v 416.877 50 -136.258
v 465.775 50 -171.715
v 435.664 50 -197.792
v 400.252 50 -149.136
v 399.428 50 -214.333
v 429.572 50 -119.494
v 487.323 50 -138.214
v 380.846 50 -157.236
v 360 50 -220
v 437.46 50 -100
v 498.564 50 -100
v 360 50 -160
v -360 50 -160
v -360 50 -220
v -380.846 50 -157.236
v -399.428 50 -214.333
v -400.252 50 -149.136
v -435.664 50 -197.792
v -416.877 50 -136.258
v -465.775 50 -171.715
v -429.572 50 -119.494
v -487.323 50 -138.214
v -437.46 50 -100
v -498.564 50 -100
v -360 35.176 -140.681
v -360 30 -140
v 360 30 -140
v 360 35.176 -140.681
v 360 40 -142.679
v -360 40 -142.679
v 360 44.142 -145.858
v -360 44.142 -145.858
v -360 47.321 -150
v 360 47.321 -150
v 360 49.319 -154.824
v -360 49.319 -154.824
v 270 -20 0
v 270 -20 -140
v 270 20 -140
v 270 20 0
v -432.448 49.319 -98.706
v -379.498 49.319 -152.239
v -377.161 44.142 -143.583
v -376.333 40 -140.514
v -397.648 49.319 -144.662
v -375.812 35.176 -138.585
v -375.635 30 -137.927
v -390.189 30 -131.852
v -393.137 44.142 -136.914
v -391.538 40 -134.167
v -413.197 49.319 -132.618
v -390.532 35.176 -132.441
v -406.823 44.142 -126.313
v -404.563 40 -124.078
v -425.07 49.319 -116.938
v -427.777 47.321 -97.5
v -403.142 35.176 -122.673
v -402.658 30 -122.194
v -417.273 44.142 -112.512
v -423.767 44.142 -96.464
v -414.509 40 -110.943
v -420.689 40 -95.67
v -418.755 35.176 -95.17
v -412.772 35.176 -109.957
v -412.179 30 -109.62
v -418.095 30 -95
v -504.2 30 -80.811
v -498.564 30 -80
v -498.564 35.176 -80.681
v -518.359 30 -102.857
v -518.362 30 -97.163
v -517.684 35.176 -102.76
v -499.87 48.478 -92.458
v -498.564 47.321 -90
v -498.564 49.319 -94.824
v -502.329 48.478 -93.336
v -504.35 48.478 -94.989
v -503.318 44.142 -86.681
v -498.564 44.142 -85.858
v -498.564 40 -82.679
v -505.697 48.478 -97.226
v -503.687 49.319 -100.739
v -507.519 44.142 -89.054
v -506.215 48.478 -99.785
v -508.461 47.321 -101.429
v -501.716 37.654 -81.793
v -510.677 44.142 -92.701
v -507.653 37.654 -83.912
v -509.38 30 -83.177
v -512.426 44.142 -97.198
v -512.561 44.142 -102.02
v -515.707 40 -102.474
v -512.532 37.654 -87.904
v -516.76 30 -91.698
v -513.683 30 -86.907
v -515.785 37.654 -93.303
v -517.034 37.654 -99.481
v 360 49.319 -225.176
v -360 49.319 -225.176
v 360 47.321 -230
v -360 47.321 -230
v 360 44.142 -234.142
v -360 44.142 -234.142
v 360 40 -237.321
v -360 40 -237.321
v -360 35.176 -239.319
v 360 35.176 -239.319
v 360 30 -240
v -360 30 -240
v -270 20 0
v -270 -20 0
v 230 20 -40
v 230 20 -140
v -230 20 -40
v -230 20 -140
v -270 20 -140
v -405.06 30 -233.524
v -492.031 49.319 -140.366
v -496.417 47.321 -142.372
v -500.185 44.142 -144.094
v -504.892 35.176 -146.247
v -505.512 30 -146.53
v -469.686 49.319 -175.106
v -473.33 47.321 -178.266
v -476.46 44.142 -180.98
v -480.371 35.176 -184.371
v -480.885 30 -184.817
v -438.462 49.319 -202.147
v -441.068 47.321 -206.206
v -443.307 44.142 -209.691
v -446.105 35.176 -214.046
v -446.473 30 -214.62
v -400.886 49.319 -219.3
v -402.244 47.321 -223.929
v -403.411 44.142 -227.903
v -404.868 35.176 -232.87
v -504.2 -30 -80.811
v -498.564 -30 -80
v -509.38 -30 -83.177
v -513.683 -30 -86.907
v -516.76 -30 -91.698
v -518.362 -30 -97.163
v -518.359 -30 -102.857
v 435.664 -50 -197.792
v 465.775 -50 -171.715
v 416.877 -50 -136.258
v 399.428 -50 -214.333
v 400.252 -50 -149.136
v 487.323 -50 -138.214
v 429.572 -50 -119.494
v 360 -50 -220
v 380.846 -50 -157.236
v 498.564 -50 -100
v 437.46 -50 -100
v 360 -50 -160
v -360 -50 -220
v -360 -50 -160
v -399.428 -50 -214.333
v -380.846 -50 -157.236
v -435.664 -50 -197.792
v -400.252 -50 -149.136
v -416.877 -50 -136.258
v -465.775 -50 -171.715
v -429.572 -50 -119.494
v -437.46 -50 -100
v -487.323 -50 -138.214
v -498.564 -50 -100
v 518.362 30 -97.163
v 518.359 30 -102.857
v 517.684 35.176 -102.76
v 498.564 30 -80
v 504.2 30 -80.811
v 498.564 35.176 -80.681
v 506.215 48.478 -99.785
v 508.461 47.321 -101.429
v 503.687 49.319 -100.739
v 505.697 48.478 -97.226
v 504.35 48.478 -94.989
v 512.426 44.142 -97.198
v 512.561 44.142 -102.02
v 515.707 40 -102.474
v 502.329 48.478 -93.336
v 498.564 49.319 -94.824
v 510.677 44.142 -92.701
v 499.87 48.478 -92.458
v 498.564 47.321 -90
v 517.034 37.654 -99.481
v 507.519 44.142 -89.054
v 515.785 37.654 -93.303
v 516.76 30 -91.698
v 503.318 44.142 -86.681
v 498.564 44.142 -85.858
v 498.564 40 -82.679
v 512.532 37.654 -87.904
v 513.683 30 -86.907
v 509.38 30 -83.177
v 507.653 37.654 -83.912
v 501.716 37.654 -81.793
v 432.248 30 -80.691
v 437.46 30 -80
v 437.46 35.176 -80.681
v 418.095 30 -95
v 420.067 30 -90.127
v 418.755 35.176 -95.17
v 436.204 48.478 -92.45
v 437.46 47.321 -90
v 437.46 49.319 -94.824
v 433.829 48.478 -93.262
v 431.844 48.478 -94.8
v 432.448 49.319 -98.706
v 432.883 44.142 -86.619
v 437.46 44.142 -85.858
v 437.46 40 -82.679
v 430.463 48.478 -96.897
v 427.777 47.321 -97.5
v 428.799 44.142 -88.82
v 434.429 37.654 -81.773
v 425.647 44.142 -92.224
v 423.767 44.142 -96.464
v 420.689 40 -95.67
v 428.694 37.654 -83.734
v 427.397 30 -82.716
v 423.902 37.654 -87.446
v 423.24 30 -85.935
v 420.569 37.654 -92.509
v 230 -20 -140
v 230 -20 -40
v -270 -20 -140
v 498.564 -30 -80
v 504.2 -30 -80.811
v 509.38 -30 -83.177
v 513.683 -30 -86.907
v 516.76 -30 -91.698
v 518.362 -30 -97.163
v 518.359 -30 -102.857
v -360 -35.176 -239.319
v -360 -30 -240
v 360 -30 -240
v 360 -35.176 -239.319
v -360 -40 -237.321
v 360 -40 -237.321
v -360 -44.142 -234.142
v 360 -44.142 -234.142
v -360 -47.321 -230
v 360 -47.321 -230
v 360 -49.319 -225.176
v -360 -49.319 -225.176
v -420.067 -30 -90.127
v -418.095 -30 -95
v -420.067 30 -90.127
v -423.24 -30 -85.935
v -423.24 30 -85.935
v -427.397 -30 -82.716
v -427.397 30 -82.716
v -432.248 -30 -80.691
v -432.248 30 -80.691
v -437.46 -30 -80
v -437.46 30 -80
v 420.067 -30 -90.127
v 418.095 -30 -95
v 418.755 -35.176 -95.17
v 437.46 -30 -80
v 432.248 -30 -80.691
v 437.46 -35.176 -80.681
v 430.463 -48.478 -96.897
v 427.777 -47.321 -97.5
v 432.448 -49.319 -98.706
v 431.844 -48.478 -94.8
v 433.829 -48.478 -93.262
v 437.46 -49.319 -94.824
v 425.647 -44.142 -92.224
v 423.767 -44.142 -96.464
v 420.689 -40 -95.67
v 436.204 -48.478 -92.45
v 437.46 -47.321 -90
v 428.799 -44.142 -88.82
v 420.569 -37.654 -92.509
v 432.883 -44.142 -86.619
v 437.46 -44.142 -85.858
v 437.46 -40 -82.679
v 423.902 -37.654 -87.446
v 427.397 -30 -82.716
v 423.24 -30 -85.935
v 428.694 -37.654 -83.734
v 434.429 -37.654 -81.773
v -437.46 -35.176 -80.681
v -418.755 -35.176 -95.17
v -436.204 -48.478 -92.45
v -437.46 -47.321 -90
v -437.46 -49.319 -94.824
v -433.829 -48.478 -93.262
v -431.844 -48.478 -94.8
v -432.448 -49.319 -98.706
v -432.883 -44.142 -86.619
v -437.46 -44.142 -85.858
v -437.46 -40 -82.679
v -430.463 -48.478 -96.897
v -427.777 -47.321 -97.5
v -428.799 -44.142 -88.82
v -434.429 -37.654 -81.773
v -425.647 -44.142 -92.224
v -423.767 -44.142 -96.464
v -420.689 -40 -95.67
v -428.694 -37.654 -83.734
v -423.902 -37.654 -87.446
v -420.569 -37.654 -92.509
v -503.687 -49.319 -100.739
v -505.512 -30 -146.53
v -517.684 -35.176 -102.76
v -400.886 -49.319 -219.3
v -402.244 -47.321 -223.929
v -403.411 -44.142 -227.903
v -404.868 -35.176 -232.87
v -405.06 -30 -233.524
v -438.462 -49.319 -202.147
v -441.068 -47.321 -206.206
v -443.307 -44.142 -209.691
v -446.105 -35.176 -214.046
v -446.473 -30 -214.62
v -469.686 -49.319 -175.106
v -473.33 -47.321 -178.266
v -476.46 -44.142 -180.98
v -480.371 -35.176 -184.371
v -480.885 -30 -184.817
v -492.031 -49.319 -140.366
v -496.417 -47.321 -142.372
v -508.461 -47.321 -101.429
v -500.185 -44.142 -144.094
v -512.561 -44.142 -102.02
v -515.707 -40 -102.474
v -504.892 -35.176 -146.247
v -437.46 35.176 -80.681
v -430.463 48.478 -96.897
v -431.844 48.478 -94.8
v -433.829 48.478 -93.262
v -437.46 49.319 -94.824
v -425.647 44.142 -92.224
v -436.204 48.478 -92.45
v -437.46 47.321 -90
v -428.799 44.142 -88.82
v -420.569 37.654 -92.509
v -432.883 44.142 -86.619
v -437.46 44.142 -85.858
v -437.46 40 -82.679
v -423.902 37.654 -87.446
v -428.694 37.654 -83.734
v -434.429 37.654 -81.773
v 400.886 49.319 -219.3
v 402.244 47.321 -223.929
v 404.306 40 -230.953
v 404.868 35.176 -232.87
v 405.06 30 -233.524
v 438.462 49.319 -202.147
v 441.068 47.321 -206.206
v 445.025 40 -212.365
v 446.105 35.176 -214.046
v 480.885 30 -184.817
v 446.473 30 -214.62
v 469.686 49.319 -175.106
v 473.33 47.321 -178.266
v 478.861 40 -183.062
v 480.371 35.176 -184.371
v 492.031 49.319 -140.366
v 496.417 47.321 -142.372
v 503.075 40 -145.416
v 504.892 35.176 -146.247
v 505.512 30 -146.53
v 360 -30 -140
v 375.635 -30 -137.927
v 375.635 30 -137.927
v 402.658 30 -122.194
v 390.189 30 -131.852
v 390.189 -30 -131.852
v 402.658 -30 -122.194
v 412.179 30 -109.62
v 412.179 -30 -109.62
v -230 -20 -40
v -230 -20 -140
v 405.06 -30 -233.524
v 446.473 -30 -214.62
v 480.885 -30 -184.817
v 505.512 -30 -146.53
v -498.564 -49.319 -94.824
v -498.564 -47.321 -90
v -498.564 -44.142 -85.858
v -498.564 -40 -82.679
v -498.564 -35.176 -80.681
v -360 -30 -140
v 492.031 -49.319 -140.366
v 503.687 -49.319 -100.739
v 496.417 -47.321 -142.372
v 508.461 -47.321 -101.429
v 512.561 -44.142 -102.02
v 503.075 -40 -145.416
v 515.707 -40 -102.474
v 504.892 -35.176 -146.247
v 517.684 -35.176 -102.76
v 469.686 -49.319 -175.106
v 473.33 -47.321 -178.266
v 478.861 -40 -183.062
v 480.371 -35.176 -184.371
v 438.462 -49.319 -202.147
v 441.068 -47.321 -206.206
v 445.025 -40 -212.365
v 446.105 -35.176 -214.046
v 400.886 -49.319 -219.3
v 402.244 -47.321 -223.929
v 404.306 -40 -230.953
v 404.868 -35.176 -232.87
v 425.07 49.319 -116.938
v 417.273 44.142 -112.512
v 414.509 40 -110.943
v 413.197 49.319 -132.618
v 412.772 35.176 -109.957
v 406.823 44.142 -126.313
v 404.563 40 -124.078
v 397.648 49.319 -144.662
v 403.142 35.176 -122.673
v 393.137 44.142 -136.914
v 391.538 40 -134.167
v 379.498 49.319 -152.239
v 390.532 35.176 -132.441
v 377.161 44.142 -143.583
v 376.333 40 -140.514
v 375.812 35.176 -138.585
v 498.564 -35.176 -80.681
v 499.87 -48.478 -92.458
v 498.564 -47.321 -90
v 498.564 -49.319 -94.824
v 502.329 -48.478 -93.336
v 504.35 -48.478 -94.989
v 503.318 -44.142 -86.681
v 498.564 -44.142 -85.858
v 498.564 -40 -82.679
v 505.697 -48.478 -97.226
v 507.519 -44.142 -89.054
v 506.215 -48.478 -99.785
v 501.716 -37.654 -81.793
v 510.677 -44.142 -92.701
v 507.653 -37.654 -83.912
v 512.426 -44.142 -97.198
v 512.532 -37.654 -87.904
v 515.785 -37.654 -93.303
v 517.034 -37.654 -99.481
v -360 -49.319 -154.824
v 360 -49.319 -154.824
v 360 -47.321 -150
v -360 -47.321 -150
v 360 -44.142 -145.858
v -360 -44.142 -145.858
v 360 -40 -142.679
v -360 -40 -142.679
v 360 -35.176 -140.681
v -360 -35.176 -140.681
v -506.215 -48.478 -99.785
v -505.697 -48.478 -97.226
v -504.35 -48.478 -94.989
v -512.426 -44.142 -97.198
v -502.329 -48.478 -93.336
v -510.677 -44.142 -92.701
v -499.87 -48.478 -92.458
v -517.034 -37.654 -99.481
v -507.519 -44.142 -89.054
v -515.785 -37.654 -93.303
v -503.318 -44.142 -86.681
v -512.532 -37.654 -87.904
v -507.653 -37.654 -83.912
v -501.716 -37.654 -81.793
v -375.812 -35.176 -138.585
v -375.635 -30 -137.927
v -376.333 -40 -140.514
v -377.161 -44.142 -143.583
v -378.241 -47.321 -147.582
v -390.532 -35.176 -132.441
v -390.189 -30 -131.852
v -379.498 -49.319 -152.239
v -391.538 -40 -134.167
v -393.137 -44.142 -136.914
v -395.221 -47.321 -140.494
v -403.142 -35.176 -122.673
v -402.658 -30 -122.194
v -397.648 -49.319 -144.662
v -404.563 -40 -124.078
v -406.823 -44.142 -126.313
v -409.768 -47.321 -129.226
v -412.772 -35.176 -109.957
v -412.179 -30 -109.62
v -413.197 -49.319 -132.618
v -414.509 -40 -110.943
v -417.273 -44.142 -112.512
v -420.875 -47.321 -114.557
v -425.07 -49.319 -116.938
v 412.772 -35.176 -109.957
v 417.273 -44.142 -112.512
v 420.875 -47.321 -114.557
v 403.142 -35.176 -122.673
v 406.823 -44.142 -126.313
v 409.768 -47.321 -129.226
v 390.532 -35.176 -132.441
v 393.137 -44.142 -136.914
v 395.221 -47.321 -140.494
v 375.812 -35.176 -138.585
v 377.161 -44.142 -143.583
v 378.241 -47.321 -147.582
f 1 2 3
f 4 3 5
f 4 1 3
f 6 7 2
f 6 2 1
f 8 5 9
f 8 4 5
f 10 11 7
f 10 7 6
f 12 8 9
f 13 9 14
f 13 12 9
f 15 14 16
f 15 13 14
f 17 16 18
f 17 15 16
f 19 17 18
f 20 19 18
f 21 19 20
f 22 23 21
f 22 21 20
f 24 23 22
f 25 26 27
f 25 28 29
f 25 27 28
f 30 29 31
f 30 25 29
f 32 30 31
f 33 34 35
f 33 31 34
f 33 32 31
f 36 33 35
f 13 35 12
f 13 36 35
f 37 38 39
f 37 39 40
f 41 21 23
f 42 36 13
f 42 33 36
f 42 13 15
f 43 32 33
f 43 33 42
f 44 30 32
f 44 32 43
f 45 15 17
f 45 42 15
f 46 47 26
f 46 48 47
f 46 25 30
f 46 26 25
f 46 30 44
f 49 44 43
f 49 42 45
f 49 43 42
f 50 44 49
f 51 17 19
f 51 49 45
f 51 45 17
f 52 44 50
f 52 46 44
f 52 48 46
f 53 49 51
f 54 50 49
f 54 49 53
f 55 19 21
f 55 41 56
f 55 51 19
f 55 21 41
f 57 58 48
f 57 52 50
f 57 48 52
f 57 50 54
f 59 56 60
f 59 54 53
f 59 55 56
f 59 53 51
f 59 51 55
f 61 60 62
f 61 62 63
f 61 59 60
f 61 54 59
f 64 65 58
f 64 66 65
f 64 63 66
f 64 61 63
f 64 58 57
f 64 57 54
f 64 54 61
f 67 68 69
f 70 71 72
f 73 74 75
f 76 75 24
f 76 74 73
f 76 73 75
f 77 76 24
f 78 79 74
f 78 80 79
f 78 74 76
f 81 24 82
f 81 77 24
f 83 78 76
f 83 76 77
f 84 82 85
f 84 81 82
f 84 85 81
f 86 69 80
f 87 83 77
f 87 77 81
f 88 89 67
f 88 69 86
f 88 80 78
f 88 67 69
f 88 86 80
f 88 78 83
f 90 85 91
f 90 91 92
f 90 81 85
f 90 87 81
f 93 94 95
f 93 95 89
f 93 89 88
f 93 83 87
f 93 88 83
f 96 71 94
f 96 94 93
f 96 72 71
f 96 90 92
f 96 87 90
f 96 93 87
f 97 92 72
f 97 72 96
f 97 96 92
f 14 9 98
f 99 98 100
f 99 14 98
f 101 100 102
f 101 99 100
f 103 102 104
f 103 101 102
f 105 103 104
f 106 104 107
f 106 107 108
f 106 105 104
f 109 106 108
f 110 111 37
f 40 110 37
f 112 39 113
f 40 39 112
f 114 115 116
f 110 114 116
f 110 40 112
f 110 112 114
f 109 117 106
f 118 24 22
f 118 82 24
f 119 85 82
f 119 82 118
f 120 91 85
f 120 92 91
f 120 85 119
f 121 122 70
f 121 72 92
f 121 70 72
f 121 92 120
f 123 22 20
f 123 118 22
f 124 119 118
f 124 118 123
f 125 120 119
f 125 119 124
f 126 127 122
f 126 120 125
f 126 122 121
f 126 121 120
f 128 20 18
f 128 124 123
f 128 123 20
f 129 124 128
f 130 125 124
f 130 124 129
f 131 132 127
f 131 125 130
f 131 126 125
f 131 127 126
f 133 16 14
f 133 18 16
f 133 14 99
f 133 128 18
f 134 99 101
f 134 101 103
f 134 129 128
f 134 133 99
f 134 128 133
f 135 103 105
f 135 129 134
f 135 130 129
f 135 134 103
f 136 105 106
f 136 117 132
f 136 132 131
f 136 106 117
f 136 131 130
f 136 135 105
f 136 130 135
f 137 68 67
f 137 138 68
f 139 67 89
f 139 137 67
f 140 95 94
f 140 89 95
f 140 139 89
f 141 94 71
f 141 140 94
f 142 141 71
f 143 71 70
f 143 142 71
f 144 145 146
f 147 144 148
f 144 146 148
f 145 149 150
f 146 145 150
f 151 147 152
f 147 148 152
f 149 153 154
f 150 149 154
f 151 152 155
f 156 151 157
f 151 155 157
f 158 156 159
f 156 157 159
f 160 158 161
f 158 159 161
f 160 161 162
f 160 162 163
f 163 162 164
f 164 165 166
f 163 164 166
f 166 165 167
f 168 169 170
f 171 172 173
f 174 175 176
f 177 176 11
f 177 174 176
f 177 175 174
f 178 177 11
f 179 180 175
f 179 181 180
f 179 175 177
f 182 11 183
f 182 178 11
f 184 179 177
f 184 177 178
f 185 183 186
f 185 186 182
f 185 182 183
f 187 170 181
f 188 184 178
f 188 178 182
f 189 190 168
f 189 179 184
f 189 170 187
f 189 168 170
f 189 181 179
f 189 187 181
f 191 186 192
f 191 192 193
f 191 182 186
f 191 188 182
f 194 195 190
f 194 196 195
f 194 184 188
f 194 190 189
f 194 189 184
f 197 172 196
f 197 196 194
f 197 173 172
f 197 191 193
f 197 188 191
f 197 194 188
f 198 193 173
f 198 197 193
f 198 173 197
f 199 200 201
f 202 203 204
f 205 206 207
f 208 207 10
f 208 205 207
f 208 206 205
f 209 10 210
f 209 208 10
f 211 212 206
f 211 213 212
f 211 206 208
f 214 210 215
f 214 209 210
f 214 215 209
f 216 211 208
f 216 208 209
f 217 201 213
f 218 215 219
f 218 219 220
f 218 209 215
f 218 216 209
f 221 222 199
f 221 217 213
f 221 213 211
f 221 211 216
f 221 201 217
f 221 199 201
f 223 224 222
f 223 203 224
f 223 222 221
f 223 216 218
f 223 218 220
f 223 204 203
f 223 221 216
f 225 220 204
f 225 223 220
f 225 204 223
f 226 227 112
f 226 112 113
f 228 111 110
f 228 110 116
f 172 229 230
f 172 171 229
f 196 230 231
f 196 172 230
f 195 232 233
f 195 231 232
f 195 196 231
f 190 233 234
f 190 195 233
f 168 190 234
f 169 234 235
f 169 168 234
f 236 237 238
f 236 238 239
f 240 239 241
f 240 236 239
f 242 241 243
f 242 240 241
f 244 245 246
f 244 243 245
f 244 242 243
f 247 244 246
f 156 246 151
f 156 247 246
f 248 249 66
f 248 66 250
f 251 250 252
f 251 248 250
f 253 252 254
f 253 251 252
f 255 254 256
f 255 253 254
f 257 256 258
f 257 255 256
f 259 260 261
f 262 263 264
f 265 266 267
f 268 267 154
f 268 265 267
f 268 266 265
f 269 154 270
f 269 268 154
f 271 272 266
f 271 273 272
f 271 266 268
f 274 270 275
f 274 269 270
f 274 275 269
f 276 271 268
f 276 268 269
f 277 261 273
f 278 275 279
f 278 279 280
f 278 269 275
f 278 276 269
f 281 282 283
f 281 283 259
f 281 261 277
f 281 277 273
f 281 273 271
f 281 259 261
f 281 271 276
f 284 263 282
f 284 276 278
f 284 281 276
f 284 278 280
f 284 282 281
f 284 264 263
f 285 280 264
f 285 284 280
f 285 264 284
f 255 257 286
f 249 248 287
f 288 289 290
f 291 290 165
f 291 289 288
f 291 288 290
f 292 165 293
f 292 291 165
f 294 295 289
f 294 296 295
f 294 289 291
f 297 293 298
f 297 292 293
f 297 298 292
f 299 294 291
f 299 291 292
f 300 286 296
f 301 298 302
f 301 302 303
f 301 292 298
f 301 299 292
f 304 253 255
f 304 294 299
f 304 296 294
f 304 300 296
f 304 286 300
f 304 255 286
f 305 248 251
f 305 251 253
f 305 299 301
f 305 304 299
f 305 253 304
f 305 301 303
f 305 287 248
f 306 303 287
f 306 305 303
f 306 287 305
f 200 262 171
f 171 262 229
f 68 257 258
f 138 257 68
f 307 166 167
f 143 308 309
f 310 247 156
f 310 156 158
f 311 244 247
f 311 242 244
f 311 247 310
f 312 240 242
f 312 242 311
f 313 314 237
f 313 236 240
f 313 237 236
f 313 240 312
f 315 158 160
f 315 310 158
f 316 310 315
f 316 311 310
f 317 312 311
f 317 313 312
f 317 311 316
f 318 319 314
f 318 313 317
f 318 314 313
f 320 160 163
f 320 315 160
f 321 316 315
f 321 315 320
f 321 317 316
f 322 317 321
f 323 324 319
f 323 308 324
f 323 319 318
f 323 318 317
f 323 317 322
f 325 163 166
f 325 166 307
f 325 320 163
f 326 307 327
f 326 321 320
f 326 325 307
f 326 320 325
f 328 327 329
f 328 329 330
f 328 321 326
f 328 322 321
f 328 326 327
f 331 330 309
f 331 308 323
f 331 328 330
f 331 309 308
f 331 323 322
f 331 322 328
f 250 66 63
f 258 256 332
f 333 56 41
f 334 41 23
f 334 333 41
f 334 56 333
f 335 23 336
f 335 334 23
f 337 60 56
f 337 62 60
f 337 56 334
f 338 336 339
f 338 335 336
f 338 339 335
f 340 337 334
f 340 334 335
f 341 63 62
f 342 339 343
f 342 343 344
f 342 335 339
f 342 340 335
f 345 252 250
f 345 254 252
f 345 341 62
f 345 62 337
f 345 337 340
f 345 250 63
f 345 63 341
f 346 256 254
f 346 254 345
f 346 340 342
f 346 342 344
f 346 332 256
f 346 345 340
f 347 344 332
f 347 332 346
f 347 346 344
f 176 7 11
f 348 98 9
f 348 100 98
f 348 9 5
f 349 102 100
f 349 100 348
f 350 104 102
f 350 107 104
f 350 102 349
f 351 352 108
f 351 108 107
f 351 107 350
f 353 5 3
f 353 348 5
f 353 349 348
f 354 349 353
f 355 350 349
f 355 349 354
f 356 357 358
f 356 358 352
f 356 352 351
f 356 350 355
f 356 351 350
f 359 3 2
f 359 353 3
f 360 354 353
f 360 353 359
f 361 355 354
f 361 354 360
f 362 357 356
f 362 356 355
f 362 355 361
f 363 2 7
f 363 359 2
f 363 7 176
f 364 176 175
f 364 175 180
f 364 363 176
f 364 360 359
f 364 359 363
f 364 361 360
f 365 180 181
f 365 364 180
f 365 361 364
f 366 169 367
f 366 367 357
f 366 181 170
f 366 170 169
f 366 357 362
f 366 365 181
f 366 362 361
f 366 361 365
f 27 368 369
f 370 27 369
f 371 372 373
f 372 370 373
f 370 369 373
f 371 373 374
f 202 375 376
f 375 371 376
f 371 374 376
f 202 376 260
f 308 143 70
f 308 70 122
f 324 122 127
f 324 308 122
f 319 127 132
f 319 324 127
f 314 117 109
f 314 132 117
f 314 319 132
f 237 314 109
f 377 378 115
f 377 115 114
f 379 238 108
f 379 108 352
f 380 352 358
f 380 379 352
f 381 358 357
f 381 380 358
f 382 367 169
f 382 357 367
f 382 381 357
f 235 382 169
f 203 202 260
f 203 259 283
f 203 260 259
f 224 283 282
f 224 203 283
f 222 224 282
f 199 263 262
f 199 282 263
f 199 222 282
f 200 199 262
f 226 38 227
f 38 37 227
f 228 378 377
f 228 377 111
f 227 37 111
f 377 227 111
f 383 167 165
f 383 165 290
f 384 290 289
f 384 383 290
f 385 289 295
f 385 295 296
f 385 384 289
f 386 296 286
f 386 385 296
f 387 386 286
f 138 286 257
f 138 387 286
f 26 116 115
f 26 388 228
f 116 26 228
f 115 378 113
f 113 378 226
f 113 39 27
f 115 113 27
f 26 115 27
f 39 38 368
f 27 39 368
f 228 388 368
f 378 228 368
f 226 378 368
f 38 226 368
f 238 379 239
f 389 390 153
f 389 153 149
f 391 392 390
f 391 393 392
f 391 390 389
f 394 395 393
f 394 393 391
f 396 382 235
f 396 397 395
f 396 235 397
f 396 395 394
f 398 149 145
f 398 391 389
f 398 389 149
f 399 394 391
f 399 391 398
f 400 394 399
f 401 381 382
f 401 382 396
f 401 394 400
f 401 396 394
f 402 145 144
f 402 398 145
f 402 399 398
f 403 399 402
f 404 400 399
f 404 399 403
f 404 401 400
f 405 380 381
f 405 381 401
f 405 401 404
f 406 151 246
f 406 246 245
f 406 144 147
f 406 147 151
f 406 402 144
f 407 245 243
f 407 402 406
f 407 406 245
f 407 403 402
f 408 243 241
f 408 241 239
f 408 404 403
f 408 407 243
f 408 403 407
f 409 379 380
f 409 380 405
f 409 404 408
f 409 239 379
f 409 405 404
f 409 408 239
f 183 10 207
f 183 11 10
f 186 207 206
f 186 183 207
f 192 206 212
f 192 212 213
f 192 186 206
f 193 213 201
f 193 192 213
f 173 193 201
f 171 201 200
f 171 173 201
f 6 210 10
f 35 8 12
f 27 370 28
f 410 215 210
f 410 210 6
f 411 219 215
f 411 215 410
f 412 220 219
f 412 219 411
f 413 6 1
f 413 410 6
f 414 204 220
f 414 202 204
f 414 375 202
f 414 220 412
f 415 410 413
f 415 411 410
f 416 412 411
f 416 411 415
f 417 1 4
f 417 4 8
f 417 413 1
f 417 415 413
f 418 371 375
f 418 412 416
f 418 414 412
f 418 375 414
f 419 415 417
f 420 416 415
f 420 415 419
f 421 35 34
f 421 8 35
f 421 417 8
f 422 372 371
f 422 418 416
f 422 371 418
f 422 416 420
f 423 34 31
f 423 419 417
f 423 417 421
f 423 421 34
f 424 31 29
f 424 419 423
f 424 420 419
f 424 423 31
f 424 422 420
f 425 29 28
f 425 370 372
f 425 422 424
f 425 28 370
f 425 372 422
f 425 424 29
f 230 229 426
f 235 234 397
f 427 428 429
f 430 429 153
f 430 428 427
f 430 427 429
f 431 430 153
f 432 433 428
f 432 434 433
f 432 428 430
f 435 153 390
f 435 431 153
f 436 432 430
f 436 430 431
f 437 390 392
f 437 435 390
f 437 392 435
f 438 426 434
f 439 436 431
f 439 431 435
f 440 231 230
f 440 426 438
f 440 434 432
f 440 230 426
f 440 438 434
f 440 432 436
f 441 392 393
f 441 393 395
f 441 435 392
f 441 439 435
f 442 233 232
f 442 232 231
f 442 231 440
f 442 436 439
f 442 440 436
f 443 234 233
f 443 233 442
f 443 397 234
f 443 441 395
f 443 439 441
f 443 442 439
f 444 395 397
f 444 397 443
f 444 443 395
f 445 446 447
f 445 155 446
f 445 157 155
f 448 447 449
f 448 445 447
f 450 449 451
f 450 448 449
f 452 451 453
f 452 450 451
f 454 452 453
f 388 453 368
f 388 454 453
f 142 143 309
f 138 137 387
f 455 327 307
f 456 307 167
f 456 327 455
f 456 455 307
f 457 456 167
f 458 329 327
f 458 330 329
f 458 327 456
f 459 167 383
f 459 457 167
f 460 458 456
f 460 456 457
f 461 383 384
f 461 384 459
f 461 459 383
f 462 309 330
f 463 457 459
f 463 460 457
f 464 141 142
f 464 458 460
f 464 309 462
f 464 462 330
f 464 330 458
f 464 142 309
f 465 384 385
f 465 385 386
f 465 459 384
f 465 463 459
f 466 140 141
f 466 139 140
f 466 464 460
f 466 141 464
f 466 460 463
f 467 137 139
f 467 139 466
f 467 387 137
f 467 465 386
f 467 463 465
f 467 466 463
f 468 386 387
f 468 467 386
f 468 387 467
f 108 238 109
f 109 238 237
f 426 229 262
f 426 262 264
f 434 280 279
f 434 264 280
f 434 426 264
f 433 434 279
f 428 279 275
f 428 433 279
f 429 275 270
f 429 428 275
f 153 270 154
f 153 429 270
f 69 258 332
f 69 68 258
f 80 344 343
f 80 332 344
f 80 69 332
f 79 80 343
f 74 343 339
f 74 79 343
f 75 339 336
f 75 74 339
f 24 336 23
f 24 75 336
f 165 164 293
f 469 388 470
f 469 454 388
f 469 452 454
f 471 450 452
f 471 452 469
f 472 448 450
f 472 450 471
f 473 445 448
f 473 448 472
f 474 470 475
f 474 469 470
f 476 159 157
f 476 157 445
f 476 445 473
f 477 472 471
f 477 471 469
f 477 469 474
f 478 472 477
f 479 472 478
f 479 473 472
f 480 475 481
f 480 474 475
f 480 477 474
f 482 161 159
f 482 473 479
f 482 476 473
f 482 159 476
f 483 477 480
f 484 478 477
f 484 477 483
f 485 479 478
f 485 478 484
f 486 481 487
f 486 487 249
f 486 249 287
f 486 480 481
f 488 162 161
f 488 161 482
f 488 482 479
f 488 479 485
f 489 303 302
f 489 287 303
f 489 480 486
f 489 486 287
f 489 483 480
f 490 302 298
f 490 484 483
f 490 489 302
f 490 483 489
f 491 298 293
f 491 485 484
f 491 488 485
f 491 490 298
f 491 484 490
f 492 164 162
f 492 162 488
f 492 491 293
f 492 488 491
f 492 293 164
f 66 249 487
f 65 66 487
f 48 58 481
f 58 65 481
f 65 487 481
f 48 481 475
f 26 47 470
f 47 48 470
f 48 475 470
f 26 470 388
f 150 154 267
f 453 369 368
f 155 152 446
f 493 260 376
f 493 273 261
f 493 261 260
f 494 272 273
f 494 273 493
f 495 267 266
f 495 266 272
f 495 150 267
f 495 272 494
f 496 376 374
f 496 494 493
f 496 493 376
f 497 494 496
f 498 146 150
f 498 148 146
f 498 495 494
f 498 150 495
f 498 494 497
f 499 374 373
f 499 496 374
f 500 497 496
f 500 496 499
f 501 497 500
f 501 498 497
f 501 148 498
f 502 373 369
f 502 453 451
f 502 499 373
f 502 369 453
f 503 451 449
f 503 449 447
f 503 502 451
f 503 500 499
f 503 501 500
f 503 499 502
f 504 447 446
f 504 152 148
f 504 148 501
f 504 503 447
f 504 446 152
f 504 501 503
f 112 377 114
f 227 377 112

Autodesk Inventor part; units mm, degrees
ref_plane "YZ Plane" through (0, 0, 0) normal (1, 0, 0) x (0, 1, 0)
ref_plane "XZ Plane" through (0, 0, 0) normal (0, 1, 0) x (-1, 0, 0)
ref_plane "XY Plane" through (0, 0, 0) normal (0, 0, 1) x (1, 0, 0)
sketch "스케치1" plane through (0, 0, 0) normal (0, 1, 0) x (-1, 0, 0)
  line L0 (270, 0) -> (-270, 0)
  line L1 (270, 0) -> (270, -240)
  line L2 (270, -240) -> (230, -240)
  line L3 (230, -240) -> (230, -40)
  line L4 (230, -40) -> (-230, -40)
  line L5 (-230, -40) -> (-230, -240)
  line L6 (-230, -240) -> (-270, -240)
  line L7 (-270, -240) -> (-270, 0)
  line L8 (-560, -240) -> (480, -240)
  arc A0 (360, -240) -> (520, -80) centre (360, -80) ccw
  arc A1 (360, -140) -> (420, -80) centre (360, -80) ccw
  line L9 (420, -80) -> (520, -80)
  line L10 (360, -140) -> (-40, -140)
  arc A2 (-520, -80) -> (-360, -240) centre (-360, -80) ccw
  arc A3 (-420, -80) -> (-360, -140) centre (-360, -80) ccw
  line L11 (-420, -80) -> (-520, -80)
  line L12 (-360, -140) -> (-40, -140)
  line L13 (360, -240) -> (-360, -240)
  point P0 (0, 0)
  point P1 (0, 0)
  point P2 (-270, -140)
  point P3 (-230, -140)
  point P4 (230, -140)
  point P5 (270, -140)
  dimension "d1" = 240
  dimension "d2" = 40
  dimension "d3" = 200
  dimension "d4" = 460
  dimension "d6" = 1040
  dimension "d9" = 240
  dimension "d11" = 100
  dimension "d12" = 160
  dimension "d13" = 160
  dimension "d14" = 160
  dimension "d17" = 210
  dimension "d18" = 310
  dimension "d24" = 270
  dimension "d25" = 0
  dimension "d26" = 250
  dimension "d27" = 60
  dimension "d28" = 0
  dimension "d29" = 160
  dimension "d30" = 0
  dimension "d31" = 60
  dimension "d32" = 40
  dimension "d33" = 160
  dimension "d34" = 40
  dimension "d35" = 60
  dimension "d36" = 500
  dimension "d37" = 160
  dimension "d38" = 500
  dimension "d39" = 60
  dimension "d40" = 540
  dimension "d41" = 160
  dimension "d42" = 540
  dimension "d43" = 630
  dimension "d44" = 160
  dimension "d45" = 630
extrude "돌출3" add sketch "스케치1" along normal mid plane 40 contours L1 L10 L3 L4 L5 L12 L7 L0
extrude "돌출4" add sketch "스케치1" along normal mid plane 100 contours L10 A1 L9 A0 L8 L1 | L1 L2 L3 L10 | L12 L5 L6 L7 | L7 L8 A2 L11 A3 L12 | L3 L8 L5 L12 L10
fillet "모깎기1" radius 20 18 edges at (-473.1371, 50, -193.1371) (473.1371, 50, -193.1371) (-473.1371, -50, -193.1371) (473.1371, -50, -193.1371) (470, 50, -80) (402.4264, 50, -122.4264) (-402.4264, 50, -122.4264) (0, 50, -140) (470, -50, -80) (-402.4264, -50, -122.4264) (402.4264, -50, -122.4264) (0, -50, -140) (-470, -50, -80) (-470, 50, -80) (-520, 0, -80) (-420, 0, -80) (420, 0, -80) (520, 0, -80)
properties part number "bumper"
